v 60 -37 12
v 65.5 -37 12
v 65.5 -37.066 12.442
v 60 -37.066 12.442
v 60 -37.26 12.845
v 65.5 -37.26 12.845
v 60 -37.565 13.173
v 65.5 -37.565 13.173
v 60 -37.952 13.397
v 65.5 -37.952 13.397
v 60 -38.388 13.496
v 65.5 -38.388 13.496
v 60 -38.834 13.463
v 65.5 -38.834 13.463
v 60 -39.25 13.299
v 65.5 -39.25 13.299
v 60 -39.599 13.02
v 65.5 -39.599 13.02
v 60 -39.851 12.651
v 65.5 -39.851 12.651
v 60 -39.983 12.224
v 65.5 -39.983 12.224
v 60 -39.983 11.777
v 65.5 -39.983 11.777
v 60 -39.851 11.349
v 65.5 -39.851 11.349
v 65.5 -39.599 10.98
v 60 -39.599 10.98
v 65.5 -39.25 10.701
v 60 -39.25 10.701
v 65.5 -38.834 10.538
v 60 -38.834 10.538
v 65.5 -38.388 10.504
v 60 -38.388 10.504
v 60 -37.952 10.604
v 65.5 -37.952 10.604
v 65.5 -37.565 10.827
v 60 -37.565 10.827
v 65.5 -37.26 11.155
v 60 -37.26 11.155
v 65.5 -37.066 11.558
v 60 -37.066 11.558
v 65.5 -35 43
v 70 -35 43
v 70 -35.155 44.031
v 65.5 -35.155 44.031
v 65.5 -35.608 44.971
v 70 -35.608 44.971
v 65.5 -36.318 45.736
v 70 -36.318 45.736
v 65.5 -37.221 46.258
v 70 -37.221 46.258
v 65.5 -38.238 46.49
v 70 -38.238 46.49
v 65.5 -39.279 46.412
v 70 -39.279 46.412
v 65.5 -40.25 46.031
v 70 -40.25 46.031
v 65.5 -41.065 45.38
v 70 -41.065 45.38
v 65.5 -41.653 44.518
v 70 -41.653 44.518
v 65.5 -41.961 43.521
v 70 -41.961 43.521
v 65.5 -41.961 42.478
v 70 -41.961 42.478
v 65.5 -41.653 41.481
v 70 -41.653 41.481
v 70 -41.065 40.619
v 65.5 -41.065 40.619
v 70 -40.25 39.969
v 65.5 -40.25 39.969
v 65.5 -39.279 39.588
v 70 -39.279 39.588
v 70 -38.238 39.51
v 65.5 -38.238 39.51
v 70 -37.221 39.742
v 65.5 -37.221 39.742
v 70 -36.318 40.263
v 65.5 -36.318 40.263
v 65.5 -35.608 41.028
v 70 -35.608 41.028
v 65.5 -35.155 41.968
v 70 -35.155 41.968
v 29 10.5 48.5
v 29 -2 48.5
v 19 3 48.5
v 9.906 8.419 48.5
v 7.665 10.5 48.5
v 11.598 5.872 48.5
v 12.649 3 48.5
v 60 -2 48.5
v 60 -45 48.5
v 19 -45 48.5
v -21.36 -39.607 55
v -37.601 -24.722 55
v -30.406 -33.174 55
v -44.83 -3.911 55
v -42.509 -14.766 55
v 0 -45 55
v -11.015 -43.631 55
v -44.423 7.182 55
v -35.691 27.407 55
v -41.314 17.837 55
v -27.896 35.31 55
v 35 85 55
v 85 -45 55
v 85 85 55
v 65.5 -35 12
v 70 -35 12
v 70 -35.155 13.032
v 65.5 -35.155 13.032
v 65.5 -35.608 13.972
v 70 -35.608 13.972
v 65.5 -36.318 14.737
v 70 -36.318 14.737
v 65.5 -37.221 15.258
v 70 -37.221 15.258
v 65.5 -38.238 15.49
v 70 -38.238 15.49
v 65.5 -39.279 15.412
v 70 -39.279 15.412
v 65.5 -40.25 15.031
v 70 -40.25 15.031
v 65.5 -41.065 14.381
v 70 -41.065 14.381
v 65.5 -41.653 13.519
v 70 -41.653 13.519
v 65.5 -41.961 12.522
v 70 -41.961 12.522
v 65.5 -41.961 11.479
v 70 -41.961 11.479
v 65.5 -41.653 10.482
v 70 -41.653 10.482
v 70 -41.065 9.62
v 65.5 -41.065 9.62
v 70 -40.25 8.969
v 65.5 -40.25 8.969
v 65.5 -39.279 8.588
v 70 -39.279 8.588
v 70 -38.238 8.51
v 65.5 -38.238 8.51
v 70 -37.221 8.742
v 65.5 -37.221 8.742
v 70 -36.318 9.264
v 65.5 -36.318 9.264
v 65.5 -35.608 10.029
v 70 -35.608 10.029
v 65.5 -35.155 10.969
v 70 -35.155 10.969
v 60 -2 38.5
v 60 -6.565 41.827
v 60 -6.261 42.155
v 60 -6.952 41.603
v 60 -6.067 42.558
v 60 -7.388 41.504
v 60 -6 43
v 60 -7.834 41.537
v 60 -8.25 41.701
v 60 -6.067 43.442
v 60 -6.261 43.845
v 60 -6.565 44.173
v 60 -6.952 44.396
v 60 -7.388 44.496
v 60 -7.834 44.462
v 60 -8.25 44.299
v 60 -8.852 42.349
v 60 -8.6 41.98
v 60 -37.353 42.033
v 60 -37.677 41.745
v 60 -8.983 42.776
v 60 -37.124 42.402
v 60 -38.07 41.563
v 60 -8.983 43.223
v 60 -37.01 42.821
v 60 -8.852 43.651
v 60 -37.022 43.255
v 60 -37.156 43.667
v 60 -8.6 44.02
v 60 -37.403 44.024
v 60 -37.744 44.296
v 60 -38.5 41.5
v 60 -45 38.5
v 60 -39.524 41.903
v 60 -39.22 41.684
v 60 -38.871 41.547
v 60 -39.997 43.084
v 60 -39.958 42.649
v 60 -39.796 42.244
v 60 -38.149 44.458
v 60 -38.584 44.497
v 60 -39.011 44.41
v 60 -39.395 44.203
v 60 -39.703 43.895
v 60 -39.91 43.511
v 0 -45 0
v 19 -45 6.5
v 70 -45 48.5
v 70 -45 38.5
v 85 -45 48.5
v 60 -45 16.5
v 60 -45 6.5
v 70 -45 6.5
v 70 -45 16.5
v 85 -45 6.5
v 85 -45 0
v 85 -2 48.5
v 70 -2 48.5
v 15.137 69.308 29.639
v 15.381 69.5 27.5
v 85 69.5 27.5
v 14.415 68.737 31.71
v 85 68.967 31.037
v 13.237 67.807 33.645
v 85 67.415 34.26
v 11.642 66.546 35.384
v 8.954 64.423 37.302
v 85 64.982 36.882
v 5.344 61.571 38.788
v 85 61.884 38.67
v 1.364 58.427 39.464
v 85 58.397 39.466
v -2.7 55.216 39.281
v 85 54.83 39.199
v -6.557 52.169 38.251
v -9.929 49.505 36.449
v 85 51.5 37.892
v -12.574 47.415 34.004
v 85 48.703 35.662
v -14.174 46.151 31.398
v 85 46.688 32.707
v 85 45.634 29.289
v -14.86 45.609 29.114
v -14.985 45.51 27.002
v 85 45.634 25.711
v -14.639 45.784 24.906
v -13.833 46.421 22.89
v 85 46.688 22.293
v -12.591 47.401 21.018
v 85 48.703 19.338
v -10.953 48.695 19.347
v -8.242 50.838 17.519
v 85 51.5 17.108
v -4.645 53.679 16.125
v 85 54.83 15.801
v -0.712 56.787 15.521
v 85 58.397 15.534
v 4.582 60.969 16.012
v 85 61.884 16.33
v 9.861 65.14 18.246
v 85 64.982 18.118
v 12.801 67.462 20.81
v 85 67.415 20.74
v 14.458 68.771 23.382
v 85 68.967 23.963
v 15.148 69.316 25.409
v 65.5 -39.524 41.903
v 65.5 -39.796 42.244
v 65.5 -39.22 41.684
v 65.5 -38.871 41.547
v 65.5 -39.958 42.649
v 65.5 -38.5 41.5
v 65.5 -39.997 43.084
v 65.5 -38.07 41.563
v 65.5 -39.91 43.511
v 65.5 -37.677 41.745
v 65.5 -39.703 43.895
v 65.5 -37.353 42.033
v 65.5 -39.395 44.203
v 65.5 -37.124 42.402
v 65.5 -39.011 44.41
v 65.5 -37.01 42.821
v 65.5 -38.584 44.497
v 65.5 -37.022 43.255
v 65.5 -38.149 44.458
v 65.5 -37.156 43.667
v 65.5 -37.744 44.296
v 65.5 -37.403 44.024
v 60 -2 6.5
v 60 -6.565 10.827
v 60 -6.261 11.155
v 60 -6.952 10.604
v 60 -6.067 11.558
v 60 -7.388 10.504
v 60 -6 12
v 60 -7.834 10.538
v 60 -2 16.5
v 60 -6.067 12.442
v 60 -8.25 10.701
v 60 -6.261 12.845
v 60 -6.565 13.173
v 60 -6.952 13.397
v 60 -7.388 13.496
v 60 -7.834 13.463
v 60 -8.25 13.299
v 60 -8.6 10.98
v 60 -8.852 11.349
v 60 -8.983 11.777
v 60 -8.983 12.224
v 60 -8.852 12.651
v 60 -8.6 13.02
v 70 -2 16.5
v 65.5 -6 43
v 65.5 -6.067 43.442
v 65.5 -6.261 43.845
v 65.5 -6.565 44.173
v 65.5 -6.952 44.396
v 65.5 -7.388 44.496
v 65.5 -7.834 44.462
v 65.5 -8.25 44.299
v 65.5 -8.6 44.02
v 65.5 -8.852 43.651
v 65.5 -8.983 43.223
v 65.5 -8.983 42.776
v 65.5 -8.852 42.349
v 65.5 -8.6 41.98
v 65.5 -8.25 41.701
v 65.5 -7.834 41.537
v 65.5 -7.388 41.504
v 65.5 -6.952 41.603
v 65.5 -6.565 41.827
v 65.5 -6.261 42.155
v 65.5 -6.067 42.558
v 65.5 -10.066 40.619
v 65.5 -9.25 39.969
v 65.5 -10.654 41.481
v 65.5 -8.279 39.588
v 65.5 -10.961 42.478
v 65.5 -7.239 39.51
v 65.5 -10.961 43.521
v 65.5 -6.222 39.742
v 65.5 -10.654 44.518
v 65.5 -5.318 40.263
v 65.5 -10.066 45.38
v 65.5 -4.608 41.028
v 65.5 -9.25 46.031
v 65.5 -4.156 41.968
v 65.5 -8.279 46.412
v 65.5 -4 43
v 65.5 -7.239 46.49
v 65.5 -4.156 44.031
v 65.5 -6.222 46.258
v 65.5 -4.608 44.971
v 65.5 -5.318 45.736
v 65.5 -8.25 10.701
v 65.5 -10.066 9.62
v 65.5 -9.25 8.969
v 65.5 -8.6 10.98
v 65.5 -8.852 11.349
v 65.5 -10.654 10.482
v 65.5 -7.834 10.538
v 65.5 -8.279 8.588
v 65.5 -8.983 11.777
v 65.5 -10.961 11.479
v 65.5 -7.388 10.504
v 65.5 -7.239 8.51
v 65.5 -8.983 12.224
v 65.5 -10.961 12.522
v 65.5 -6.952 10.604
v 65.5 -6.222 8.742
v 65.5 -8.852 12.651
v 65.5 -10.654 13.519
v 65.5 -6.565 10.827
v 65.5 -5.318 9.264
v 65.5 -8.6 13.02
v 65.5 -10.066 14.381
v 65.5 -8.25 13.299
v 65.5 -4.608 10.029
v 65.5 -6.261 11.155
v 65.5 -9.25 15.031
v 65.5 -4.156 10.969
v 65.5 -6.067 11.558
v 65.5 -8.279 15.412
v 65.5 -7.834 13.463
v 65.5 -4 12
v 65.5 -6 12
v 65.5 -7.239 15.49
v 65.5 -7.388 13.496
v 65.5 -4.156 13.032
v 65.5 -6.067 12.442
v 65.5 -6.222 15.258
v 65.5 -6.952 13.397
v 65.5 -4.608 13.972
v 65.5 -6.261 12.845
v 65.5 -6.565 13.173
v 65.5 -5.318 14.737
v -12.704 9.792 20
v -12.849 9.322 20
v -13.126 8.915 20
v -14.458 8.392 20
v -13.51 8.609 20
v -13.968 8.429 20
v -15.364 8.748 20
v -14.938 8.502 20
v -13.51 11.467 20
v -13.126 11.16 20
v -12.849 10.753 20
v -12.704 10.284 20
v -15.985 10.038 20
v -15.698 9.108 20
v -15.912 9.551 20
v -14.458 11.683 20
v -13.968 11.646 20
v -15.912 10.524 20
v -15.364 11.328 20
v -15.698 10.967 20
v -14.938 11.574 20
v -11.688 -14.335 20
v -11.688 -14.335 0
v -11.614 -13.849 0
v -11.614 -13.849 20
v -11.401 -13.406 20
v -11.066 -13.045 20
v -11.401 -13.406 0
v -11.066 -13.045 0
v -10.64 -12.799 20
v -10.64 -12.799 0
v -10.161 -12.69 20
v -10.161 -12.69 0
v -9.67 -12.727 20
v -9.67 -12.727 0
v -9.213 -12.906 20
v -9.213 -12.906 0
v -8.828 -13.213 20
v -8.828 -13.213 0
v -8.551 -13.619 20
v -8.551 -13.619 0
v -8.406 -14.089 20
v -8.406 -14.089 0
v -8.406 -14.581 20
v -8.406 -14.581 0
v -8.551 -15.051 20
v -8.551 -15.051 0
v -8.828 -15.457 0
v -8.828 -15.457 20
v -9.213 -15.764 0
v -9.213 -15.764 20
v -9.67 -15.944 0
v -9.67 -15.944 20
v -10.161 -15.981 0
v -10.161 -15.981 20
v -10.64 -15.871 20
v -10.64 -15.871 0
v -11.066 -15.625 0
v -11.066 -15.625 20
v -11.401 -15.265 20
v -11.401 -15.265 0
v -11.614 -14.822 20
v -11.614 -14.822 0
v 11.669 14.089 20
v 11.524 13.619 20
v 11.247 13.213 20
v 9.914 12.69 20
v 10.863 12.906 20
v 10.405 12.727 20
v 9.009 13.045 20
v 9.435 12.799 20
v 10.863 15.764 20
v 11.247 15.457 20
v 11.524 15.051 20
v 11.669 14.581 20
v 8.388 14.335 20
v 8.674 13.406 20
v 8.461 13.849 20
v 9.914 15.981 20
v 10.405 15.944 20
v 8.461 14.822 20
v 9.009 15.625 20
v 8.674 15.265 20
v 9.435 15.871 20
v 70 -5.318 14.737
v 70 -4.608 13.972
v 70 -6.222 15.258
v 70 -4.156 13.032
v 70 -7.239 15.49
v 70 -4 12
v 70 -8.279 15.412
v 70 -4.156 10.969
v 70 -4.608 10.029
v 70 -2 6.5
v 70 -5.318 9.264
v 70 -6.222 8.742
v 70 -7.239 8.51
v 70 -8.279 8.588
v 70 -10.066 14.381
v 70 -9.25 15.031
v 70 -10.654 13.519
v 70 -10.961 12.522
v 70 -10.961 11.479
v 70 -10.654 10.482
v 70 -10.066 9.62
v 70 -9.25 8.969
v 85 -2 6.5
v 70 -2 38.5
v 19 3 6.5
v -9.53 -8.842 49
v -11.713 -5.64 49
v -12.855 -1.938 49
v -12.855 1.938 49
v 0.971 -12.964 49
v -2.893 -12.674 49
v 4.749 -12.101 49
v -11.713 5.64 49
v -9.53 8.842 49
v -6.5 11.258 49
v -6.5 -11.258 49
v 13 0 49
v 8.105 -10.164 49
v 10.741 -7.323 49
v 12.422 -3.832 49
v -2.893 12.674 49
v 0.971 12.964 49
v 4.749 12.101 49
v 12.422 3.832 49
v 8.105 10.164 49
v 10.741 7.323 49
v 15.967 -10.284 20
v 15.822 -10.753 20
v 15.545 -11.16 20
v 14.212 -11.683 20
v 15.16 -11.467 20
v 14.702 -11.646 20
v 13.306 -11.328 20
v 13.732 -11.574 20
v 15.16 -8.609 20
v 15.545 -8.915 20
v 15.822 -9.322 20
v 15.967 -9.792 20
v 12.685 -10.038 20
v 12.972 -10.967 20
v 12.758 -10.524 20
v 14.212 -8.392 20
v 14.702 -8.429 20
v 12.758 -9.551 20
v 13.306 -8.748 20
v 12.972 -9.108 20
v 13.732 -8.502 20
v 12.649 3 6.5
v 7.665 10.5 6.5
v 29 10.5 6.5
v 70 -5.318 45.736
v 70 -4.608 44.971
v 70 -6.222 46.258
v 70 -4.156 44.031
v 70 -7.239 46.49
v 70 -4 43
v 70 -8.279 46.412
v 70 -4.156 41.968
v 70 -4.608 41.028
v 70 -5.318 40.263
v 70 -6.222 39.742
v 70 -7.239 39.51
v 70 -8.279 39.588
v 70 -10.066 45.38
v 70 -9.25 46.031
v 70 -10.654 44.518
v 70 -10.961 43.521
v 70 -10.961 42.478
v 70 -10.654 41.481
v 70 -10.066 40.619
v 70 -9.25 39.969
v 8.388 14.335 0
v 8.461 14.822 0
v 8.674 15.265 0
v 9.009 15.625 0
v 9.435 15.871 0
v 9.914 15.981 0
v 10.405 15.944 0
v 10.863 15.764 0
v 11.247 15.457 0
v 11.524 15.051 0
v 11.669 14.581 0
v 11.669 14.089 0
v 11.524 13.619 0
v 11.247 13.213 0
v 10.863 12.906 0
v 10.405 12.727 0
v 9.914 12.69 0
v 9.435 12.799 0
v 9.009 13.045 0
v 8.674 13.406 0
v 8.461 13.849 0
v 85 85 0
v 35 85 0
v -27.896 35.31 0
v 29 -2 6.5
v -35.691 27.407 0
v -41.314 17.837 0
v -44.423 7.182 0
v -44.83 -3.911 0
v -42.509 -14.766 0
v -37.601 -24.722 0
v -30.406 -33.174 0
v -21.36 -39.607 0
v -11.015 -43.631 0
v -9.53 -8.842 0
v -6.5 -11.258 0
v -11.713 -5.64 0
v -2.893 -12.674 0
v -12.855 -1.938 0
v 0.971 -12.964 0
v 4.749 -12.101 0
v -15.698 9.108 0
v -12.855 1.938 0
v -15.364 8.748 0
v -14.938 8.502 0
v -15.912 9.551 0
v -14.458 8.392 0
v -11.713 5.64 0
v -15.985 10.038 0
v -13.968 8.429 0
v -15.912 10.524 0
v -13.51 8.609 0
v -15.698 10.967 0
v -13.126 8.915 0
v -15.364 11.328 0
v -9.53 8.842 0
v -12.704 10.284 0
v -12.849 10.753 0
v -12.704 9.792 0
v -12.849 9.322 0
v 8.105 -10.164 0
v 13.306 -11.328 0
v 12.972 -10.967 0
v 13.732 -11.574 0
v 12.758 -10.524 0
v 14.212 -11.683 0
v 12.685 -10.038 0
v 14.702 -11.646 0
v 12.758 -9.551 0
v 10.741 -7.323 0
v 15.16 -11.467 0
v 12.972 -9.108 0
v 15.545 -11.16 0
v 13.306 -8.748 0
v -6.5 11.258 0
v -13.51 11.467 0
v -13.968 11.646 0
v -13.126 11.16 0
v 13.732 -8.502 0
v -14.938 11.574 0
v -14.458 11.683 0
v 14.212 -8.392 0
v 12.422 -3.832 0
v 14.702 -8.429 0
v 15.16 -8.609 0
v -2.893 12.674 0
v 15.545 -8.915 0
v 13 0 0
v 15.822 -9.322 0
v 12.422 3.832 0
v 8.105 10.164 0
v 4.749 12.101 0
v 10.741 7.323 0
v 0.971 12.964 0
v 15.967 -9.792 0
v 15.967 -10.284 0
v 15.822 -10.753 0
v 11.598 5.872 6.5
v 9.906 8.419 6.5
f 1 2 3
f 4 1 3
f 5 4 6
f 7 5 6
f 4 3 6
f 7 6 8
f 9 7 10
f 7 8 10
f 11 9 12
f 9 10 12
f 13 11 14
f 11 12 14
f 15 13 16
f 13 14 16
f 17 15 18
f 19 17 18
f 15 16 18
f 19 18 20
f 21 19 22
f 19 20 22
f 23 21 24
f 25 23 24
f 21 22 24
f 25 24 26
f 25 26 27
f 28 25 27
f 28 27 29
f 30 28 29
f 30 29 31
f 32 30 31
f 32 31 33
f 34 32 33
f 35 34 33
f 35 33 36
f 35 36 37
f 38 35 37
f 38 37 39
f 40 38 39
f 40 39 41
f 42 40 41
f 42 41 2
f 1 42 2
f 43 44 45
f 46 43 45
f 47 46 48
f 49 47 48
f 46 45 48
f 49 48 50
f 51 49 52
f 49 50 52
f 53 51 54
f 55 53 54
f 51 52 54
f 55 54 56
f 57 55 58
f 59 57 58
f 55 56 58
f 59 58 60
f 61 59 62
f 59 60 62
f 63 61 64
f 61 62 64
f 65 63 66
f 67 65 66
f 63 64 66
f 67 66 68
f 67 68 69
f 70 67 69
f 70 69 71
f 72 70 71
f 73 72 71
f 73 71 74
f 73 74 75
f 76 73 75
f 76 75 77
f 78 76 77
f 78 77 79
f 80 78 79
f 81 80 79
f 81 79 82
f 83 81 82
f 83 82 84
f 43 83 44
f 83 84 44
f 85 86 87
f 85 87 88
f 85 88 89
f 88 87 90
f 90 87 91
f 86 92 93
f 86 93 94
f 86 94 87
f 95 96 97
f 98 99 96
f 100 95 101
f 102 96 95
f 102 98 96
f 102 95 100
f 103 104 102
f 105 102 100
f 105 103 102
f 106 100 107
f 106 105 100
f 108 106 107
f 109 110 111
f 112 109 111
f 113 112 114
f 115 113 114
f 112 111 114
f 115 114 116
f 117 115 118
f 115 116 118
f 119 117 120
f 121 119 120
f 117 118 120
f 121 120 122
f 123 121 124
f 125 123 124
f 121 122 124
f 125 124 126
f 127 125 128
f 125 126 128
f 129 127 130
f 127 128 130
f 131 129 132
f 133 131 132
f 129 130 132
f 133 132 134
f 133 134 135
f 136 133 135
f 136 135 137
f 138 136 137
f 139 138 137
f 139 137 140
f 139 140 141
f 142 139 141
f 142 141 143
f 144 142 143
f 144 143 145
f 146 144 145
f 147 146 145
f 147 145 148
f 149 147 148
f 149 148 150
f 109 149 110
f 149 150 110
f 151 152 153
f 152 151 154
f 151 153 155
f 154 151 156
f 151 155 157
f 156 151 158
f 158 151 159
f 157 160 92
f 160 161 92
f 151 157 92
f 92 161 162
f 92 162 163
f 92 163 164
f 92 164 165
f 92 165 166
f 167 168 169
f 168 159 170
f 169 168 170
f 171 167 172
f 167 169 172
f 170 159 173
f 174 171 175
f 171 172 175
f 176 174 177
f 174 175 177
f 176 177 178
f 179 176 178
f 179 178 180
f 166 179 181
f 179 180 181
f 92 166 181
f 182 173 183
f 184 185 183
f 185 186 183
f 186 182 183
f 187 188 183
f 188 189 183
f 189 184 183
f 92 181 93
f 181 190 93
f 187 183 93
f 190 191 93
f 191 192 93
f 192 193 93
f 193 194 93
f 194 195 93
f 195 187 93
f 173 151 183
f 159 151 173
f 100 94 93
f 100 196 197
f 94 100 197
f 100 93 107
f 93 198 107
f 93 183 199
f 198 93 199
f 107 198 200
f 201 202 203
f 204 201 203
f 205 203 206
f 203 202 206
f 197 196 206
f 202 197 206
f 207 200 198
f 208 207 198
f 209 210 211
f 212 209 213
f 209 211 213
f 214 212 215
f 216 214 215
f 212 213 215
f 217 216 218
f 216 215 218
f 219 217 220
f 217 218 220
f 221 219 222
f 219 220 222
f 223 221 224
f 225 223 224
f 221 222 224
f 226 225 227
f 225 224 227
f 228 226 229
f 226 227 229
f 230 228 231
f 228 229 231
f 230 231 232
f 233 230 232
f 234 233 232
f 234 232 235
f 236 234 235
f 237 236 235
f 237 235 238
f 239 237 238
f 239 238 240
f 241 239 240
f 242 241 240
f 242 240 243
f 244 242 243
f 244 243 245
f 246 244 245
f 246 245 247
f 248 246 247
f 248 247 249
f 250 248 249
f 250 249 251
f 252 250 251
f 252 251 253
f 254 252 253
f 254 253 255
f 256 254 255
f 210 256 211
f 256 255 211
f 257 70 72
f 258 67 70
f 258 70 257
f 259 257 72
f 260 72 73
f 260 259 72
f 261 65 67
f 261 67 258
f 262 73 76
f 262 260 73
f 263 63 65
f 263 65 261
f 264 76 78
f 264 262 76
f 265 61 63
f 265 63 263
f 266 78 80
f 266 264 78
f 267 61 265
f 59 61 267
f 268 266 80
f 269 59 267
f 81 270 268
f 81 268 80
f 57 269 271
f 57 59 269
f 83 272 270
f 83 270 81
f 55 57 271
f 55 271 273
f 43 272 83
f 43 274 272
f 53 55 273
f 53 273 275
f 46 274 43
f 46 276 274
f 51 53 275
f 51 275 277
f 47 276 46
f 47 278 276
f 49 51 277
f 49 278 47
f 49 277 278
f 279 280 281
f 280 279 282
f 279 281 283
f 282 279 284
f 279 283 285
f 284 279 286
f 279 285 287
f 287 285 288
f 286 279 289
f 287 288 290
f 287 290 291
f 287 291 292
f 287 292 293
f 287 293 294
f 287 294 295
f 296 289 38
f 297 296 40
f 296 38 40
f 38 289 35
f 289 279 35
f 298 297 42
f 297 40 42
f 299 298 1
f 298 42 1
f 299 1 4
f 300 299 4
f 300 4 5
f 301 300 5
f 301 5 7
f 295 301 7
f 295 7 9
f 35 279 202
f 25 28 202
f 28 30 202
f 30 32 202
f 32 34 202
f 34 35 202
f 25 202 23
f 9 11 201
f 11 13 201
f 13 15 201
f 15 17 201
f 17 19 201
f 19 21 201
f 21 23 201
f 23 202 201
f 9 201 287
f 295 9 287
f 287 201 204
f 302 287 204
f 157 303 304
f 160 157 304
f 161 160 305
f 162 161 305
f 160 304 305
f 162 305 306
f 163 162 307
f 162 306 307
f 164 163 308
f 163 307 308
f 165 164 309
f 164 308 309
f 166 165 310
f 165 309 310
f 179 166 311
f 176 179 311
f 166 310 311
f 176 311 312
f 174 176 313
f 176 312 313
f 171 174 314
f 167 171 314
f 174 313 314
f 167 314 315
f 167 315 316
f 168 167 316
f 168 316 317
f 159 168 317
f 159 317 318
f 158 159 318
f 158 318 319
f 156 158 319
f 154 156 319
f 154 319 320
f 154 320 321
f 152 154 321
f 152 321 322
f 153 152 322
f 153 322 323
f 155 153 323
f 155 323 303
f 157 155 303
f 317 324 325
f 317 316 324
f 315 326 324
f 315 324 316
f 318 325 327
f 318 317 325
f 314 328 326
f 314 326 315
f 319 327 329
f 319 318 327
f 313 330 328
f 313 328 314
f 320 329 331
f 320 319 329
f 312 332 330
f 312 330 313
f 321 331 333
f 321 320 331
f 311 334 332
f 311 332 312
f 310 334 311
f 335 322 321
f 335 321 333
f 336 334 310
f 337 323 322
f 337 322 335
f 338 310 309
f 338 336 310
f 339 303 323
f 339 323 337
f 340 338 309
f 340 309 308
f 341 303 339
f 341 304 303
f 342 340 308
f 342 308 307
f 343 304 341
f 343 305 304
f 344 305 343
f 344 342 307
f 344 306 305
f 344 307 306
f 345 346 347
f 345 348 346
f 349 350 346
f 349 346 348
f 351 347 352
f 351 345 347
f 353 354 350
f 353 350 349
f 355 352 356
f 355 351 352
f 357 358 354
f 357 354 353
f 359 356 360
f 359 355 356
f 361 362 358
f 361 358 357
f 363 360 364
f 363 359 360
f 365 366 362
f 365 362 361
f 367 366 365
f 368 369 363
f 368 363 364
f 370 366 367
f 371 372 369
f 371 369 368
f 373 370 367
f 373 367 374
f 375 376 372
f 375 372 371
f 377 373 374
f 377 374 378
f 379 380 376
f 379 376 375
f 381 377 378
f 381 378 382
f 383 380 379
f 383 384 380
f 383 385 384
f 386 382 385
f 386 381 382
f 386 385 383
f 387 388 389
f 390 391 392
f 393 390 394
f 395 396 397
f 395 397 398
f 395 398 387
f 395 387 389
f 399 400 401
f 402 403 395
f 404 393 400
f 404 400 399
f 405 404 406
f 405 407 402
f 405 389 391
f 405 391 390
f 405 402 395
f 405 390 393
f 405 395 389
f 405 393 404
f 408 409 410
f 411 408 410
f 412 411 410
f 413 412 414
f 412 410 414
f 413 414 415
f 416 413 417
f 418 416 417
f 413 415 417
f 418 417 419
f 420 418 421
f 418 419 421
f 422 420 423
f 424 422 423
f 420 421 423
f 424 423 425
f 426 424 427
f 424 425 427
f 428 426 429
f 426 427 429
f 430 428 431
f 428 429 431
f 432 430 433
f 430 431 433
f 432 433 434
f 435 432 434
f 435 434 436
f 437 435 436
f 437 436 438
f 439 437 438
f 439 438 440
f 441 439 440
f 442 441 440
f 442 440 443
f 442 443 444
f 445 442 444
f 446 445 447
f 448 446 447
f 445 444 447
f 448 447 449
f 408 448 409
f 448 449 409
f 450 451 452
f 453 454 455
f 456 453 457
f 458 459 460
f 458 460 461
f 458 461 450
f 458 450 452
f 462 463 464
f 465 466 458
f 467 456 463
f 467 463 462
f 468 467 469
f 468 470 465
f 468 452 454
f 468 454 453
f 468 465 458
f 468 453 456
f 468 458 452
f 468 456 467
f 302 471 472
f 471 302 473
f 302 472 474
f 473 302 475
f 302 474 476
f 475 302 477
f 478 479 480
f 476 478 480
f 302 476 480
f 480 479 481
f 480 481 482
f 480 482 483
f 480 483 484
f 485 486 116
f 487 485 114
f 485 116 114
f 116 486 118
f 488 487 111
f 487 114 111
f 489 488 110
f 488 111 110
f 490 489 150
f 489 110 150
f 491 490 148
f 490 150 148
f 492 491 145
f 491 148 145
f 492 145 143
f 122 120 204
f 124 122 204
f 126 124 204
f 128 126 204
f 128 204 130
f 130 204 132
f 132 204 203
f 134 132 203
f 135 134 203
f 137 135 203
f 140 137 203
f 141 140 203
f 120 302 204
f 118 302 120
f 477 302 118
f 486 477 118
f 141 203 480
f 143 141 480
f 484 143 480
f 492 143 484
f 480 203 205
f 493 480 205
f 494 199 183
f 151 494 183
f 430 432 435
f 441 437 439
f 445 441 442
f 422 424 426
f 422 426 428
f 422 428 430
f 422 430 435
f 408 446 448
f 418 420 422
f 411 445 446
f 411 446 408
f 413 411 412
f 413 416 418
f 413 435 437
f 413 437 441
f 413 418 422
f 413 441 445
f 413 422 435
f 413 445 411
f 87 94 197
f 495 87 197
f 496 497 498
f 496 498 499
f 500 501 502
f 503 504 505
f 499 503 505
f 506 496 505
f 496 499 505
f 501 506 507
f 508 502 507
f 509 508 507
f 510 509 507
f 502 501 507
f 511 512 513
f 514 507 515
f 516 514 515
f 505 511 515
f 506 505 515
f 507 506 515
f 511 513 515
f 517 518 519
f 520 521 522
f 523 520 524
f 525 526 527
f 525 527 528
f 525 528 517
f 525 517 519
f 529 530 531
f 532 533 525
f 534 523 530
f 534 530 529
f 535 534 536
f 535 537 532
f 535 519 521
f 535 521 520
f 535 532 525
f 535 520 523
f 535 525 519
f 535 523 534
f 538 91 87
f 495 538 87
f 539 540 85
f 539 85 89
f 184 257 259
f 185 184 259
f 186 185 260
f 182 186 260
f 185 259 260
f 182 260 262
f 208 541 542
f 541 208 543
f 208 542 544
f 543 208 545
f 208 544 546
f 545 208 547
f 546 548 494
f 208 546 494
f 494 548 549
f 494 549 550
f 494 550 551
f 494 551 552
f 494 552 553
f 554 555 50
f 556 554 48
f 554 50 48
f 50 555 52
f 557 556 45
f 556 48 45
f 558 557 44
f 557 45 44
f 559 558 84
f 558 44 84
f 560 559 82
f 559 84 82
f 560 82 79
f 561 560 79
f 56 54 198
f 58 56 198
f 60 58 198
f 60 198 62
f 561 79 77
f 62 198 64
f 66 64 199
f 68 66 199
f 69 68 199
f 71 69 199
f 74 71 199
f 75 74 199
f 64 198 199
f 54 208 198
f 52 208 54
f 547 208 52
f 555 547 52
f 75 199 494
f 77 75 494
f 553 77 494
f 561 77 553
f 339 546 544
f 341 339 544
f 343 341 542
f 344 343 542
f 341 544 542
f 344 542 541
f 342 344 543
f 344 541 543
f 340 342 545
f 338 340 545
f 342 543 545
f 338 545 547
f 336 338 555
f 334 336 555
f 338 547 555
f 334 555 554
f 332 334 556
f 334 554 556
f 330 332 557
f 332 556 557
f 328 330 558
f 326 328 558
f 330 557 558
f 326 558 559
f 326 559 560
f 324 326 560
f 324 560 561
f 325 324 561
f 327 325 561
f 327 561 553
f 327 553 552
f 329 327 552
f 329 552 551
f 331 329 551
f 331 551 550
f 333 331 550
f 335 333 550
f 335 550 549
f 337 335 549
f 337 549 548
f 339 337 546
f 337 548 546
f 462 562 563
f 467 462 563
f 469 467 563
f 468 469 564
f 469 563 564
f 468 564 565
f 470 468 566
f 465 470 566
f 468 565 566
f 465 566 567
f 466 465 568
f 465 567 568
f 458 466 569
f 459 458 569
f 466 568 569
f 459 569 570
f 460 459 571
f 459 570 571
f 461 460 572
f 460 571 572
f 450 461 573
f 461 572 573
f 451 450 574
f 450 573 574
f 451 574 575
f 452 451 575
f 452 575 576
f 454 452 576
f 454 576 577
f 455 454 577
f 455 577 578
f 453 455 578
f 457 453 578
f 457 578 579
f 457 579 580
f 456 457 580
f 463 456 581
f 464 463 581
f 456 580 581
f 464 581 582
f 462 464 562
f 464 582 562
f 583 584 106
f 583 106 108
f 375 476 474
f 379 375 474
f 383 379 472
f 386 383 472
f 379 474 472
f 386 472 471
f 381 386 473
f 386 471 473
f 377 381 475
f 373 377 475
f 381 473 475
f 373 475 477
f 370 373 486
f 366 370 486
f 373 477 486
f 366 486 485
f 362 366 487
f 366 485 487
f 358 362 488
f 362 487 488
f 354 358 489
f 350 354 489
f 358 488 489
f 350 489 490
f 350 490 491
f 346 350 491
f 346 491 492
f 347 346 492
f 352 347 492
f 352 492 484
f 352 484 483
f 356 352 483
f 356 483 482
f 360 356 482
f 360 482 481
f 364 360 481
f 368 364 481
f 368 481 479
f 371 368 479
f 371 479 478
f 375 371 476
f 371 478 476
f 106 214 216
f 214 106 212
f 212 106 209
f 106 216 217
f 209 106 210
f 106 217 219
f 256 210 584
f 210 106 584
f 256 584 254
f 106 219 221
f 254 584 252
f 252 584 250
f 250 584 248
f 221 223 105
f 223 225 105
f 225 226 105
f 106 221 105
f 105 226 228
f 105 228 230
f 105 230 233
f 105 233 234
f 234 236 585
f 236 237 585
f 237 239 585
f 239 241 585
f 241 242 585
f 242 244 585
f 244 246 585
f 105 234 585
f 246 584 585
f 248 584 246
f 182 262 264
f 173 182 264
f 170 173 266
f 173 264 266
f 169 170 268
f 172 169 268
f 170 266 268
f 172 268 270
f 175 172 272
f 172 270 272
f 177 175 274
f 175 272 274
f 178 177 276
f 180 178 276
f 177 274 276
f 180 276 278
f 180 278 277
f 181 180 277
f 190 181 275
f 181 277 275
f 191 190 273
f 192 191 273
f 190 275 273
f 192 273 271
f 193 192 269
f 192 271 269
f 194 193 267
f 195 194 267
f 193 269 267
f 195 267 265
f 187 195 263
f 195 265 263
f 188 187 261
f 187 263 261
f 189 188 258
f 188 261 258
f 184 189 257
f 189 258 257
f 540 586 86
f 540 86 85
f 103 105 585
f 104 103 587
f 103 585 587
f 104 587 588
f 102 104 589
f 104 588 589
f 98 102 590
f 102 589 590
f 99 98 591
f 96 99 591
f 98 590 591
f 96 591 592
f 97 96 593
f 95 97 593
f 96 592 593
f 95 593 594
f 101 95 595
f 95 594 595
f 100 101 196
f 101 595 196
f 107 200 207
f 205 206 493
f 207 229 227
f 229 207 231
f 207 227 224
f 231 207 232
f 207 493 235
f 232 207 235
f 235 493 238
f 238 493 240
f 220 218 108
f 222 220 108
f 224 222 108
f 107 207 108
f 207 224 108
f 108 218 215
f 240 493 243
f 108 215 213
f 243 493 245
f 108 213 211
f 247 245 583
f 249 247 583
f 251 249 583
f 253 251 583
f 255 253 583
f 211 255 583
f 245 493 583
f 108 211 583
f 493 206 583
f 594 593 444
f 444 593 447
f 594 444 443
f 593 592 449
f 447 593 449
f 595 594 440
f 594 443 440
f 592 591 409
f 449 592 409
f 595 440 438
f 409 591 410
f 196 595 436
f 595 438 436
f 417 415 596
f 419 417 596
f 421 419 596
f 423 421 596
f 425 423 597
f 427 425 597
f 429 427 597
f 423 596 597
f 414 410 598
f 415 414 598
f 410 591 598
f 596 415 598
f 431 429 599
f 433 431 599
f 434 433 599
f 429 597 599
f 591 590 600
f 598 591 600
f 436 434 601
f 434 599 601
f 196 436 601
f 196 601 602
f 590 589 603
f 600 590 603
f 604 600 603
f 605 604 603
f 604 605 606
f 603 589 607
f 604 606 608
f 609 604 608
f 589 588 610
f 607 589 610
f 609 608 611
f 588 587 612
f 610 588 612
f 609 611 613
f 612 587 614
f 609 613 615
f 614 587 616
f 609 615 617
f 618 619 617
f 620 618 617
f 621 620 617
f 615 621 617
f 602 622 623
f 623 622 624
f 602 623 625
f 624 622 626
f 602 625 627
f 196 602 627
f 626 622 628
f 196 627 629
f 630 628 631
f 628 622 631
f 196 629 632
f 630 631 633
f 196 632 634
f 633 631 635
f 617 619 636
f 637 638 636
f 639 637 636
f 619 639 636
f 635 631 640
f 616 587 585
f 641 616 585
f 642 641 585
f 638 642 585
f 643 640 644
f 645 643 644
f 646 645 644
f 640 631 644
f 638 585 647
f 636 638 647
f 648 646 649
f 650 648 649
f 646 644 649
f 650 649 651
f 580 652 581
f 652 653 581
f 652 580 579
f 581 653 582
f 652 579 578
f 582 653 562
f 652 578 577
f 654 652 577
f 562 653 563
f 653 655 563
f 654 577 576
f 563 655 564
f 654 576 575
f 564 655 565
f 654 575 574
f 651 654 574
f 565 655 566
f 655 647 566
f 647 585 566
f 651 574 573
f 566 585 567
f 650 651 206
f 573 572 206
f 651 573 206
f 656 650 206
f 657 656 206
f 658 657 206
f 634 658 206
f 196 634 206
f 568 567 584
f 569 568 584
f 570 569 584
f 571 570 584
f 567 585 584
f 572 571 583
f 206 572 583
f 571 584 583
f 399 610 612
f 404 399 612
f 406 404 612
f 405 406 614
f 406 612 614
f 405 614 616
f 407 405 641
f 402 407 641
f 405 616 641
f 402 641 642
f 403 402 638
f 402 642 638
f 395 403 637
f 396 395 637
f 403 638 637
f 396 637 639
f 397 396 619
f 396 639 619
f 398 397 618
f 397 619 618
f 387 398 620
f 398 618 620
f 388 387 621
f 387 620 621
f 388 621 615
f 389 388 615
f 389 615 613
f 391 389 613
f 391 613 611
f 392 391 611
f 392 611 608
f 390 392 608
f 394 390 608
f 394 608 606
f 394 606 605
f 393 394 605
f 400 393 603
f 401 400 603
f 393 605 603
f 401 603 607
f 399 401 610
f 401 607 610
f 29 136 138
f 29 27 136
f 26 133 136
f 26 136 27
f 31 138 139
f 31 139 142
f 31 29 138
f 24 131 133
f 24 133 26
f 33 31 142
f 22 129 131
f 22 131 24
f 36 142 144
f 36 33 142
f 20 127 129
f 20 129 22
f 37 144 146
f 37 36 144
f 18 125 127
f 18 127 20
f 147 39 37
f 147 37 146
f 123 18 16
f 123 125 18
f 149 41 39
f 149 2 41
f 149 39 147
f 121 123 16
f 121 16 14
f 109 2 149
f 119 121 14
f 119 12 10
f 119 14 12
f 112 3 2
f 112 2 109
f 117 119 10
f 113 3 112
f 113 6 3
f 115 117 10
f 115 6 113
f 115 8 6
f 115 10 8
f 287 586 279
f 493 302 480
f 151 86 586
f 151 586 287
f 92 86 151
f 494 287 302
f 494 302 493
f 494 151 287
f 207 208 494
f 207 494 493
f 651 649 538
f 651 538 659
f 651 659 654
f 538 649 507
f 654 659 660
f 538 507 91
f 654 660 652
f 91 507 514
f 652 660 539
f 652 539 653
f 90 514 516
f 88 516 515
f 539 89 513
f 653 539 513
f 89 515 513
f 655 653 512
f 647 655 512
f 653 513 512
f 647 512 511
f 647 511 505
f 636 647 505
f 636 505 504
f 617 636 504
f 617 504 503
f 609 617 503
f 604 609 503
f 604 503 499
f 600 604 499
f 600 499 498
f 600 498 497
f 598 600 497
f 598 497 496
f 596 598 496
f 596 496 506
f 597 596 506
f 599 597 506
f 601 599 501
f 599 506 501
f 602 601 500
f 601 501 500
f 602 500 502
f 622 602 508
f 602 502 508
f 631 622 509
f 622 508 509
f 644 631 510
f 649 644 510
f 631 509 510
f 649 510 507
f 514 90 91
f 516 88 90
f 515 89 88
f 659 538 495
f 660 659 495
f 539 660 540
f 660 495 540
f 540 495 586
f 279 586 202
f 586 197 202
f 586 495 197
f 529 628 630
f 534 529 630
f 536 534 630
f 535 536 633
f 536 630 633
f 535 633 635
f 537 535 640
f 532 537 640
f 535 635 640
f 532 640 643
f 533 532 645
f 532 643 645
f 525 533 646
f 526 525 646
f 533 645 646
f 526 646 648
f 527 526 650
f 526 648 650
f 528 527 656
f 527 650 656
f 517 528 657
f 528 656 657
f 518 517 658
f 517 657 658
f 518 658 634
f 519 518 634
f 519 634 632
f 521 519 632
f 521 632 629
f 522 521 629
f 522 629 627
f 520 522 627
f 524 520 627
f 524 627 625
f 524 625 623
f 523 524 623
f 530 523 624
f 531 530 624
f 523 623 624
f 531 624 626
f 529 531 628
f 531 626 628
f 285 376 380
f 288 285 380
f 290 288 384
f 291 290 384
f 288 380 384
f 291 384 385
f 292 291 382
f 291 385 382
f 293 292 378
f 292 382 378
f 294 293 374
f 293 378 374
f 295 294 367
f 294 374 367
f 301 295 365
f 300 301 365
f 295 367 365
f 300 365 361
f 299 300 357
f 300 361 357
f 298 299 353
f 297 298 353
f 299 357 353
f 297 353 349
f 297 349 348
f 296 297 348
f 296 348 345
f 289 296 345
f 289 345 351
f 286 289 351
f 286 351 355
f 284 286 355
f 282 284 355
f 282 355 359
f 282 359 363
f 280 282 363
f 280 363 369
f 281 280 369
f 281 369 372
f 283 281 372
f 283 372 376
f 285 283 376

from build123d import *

# Parameters (mm, degrees)
SKIZZE1_W                       = 50
SKIZZE1_H                       = 50
SKIZZE1_R                       = 45
AUFSATZ_LINEAR_AUSTRAGEN2_DEPTH = 55
SCHNITT_LINEAR_AUSTRAGEN1_DEPTH = 43
SKIZZE4_R                       = 1.5
SCHNITT_LINEAR_AUSTRAGEN2_DEPTH = 10
SKIZZE5_R                       = 3.5
SCHNITT_LINEAR_AUSTRAGEN3_DEPTH = 4.5
SCHNITT_LINEAR_AUSTRAGEN4_DEPTH = 21
SCHNITT_LINEAR_START            = -6
SKIZZE7_R                       = 13
SCHNITT_LINEAR_AUSTRAGEN5_DEPTH = 49
SKIZZE8_R                       = 12
SCHNITT_LINEAR_AUSTRAGEN6_DEPTH = 165.772570533
SKIZZE9_R                       = 1.65
SCHNITT_LINEAR_AUSTRAGEN9_DEPTH = 20


with BuildPart() as part:
    # Skizze1 → Aufsatz-Linear austragen2 (new body)
    with BuildSketch(Plane.XY):
        with BuildLine():
            Line((35, 35), (35, 85))
            Line((35, 85), (-27.896103401, 35.310160224))
            ThreePointArc((-27.896103401, 35.310160224), (19.617279971, 40.498917597), (45, 0))
            ThreePointArc((45, 0), (31.819805153, -31.819805153), (0, -45))
            Line((0, -45), (85, -45))
            Line((85, -45), (85, 35))
            Line((85, 35), (35, 35))
        make_face()
        with Locations((60, 60)):
            Rectangle(SKIZZE1_W, SKIZZE1_H)
        Circle(SKIZZE1_R)
    extrude(amount=AUFSATZ_LINEAR_AUSTRAGEN2_DEPTH)

    # Skizze3 → Schnitt-Linear austragen1 (cut)
    with BuildSketch(Plane.XZ.offset(45)):
        Polygon((60, 48.5), (19, 48.5), (19, 6.5), (60, 6.5), (60, 16.5), (70, 16.5), (70, 6.5), (85, 6.5), (85, 48.5), (70, 48.5), (70, 38.5), (60, 38.5), align=None)
    extrude(amount=-SCHNITT_LINEAR_AUSTRAGEN1_DEPTH, mode=Mode.SUBTRACT)

    # Skizze4 → Schnitt-Linear austragen2 (cut)
    with BuildSketch(Plane(origin=(70, 0, 0), x_dir=(0, 0, -1), z_dir=(1, 0, 0))):
        with Locations(Location((-42.999780644, -7.500219356, 0), (0, 0, 90))):
            Circle(SKIZZE4_R)
        with Locations(Location((-12.000219356, -7.500219356, 0), (0, 0, 90))):
            Circle(SKIZZE4_R)
        with Locations(Location((-12.000219356, -38.499780644, 0), (0, 0, 90))):
            Circle(SKIZZE4_R)
        with BuildLine():
            ThreePointArc((-41.499780644, -38.499780644), (-42.402127924, -37.123985882), (-44.023528946, -37.403450669))
            ThreePointArc((-44.023528946, -37.403450669), (-42.999780644, -38.499780644), (-41.903450669, -39.523528946))
            ThreePointArc((-41.903450669, -39.523528946), (-41.604342547, -39.050010158), (-41.499780644, -38.499780644))
        make_face()
        with BuildLine():
            ThreePointArc((-41.903450669, -39.523528946), (-42.999780644, -38.499780644), (-44.023528946, -37.403450669))
            ThreePointArc((-44.023528946, -37.403450669), (-44.060440815, -39.560440815), (-41.903450669, -39.523528946))
        make_face()
    extrude(amount=-SCHNITT_LINEAR_AUSTRAGEN2_DEPTH, mode=Mode.SUBTRACT)

    # Skizze5 → Schnitt-Linear austragen3 (cut)
    with BuildSketch(Plane(origin=(70, 0, 0), x_dir=(0, 0, -1), z_dir=(1, 0, 0))):
        with Locations(Location((-42.999780644, -7.500219356, 0), (0, 0, 90))):
            Circle(SKIZZE5_R)
        with Locations(Location((-12.000219356, -7.500219356, 0), (0, 0, 90))):
            Circle(SKIZZE5_R)
        with Locations(Location((-12.000219356, -38.499780644, 0), (0, 0, 90))):
            Circle(SKIZZE5_R)
        with Locations(Location((-42.999780644, -38.499780644, 0), (0, 0, 90))):
            Circle(SKIZZE5_R)
    extrude(amount=-SCHNITT_LINEAR_AUSTRAGEN3_DEPTH, mode=Mode.SUBTRACT)

    # Skizze6 → Schnitt-Linear austragen4 (cut, symmetric)
    with BuildSketch(Plane.XY.offset(27.5)):
        Polygon((29, 10.5), (19, 10.5), (19, 3), (19, -2), (29, -2), align=None)
        with BuildLine():
            Line((19, 3), (19, 10.5))
            Line((19, 10.5), (5.809475019, 10.5))
            ThreePointArc((5.809475019, 10.5), (9.486832981, 7.348469228), (11.618950039, 3))
            Line((11.618950039, 3), (19, 3))
        make_face()
    extrude(amount=SCHNITT_LINEAR_AUSTRAGEN4_DEPTH, both=True, mode=Mode.SUBTRACT)

    # Skizze7 → Schnitt-Linear austragen5 (cut)
    with BuildSketch(Plane.XY.offset(55).offset(SCHNITT_LINEAR_START)):
        Circle(SKIZZE7_R)
    extrude(amount=-SCHNITT_LINEAR_AUSTRAGEN5_DEPTH, mode=Mode.SUBTRACT)

    # Skizze8 → Schnitt-Linear austragen6 (cut, through all)
    with BuildSketch(Plane(origin=(85, 0, 0), x_dir=(0, 0, -1), z_dir=(1, 0, 0))):
        with Locations(Location((-27.5, 57.5, 0), (0, 0, 90))):
            Circle(SKIZZE8_R)
    extrude(amount=-SCHNITT_LINEAR_AUSTRAGEN6_DEPTH, mode=Mode.SUBTRACT)

    # Skizze9 → Schnitt-Linear austragen9 (cut)
    with BuildSketch(Plane(origin=(0, 0, 0), x_dir=(-1, 0, 0), z_dir=(0, 0, -1))):
        with Locations((-10.037587636, 14.335160775)):
            Circle(SKIZZE9_R)
        with Locations((14.335160775, 10.037587636)):
            Circle(SKIZZE9_R)
        with Locations((10.037587636, -14.335160775)):
            Circle(SKIZZE9_R)
        with Locations((-14.335160775, -10.037587636)):
            Circle(SKIZZE9_R)
    extrude(amount=-SCHNITT_LINEAR_AUSTRAGEN9_DEPTH, mode=Mode.SUBTRACT)


solid = part.part
